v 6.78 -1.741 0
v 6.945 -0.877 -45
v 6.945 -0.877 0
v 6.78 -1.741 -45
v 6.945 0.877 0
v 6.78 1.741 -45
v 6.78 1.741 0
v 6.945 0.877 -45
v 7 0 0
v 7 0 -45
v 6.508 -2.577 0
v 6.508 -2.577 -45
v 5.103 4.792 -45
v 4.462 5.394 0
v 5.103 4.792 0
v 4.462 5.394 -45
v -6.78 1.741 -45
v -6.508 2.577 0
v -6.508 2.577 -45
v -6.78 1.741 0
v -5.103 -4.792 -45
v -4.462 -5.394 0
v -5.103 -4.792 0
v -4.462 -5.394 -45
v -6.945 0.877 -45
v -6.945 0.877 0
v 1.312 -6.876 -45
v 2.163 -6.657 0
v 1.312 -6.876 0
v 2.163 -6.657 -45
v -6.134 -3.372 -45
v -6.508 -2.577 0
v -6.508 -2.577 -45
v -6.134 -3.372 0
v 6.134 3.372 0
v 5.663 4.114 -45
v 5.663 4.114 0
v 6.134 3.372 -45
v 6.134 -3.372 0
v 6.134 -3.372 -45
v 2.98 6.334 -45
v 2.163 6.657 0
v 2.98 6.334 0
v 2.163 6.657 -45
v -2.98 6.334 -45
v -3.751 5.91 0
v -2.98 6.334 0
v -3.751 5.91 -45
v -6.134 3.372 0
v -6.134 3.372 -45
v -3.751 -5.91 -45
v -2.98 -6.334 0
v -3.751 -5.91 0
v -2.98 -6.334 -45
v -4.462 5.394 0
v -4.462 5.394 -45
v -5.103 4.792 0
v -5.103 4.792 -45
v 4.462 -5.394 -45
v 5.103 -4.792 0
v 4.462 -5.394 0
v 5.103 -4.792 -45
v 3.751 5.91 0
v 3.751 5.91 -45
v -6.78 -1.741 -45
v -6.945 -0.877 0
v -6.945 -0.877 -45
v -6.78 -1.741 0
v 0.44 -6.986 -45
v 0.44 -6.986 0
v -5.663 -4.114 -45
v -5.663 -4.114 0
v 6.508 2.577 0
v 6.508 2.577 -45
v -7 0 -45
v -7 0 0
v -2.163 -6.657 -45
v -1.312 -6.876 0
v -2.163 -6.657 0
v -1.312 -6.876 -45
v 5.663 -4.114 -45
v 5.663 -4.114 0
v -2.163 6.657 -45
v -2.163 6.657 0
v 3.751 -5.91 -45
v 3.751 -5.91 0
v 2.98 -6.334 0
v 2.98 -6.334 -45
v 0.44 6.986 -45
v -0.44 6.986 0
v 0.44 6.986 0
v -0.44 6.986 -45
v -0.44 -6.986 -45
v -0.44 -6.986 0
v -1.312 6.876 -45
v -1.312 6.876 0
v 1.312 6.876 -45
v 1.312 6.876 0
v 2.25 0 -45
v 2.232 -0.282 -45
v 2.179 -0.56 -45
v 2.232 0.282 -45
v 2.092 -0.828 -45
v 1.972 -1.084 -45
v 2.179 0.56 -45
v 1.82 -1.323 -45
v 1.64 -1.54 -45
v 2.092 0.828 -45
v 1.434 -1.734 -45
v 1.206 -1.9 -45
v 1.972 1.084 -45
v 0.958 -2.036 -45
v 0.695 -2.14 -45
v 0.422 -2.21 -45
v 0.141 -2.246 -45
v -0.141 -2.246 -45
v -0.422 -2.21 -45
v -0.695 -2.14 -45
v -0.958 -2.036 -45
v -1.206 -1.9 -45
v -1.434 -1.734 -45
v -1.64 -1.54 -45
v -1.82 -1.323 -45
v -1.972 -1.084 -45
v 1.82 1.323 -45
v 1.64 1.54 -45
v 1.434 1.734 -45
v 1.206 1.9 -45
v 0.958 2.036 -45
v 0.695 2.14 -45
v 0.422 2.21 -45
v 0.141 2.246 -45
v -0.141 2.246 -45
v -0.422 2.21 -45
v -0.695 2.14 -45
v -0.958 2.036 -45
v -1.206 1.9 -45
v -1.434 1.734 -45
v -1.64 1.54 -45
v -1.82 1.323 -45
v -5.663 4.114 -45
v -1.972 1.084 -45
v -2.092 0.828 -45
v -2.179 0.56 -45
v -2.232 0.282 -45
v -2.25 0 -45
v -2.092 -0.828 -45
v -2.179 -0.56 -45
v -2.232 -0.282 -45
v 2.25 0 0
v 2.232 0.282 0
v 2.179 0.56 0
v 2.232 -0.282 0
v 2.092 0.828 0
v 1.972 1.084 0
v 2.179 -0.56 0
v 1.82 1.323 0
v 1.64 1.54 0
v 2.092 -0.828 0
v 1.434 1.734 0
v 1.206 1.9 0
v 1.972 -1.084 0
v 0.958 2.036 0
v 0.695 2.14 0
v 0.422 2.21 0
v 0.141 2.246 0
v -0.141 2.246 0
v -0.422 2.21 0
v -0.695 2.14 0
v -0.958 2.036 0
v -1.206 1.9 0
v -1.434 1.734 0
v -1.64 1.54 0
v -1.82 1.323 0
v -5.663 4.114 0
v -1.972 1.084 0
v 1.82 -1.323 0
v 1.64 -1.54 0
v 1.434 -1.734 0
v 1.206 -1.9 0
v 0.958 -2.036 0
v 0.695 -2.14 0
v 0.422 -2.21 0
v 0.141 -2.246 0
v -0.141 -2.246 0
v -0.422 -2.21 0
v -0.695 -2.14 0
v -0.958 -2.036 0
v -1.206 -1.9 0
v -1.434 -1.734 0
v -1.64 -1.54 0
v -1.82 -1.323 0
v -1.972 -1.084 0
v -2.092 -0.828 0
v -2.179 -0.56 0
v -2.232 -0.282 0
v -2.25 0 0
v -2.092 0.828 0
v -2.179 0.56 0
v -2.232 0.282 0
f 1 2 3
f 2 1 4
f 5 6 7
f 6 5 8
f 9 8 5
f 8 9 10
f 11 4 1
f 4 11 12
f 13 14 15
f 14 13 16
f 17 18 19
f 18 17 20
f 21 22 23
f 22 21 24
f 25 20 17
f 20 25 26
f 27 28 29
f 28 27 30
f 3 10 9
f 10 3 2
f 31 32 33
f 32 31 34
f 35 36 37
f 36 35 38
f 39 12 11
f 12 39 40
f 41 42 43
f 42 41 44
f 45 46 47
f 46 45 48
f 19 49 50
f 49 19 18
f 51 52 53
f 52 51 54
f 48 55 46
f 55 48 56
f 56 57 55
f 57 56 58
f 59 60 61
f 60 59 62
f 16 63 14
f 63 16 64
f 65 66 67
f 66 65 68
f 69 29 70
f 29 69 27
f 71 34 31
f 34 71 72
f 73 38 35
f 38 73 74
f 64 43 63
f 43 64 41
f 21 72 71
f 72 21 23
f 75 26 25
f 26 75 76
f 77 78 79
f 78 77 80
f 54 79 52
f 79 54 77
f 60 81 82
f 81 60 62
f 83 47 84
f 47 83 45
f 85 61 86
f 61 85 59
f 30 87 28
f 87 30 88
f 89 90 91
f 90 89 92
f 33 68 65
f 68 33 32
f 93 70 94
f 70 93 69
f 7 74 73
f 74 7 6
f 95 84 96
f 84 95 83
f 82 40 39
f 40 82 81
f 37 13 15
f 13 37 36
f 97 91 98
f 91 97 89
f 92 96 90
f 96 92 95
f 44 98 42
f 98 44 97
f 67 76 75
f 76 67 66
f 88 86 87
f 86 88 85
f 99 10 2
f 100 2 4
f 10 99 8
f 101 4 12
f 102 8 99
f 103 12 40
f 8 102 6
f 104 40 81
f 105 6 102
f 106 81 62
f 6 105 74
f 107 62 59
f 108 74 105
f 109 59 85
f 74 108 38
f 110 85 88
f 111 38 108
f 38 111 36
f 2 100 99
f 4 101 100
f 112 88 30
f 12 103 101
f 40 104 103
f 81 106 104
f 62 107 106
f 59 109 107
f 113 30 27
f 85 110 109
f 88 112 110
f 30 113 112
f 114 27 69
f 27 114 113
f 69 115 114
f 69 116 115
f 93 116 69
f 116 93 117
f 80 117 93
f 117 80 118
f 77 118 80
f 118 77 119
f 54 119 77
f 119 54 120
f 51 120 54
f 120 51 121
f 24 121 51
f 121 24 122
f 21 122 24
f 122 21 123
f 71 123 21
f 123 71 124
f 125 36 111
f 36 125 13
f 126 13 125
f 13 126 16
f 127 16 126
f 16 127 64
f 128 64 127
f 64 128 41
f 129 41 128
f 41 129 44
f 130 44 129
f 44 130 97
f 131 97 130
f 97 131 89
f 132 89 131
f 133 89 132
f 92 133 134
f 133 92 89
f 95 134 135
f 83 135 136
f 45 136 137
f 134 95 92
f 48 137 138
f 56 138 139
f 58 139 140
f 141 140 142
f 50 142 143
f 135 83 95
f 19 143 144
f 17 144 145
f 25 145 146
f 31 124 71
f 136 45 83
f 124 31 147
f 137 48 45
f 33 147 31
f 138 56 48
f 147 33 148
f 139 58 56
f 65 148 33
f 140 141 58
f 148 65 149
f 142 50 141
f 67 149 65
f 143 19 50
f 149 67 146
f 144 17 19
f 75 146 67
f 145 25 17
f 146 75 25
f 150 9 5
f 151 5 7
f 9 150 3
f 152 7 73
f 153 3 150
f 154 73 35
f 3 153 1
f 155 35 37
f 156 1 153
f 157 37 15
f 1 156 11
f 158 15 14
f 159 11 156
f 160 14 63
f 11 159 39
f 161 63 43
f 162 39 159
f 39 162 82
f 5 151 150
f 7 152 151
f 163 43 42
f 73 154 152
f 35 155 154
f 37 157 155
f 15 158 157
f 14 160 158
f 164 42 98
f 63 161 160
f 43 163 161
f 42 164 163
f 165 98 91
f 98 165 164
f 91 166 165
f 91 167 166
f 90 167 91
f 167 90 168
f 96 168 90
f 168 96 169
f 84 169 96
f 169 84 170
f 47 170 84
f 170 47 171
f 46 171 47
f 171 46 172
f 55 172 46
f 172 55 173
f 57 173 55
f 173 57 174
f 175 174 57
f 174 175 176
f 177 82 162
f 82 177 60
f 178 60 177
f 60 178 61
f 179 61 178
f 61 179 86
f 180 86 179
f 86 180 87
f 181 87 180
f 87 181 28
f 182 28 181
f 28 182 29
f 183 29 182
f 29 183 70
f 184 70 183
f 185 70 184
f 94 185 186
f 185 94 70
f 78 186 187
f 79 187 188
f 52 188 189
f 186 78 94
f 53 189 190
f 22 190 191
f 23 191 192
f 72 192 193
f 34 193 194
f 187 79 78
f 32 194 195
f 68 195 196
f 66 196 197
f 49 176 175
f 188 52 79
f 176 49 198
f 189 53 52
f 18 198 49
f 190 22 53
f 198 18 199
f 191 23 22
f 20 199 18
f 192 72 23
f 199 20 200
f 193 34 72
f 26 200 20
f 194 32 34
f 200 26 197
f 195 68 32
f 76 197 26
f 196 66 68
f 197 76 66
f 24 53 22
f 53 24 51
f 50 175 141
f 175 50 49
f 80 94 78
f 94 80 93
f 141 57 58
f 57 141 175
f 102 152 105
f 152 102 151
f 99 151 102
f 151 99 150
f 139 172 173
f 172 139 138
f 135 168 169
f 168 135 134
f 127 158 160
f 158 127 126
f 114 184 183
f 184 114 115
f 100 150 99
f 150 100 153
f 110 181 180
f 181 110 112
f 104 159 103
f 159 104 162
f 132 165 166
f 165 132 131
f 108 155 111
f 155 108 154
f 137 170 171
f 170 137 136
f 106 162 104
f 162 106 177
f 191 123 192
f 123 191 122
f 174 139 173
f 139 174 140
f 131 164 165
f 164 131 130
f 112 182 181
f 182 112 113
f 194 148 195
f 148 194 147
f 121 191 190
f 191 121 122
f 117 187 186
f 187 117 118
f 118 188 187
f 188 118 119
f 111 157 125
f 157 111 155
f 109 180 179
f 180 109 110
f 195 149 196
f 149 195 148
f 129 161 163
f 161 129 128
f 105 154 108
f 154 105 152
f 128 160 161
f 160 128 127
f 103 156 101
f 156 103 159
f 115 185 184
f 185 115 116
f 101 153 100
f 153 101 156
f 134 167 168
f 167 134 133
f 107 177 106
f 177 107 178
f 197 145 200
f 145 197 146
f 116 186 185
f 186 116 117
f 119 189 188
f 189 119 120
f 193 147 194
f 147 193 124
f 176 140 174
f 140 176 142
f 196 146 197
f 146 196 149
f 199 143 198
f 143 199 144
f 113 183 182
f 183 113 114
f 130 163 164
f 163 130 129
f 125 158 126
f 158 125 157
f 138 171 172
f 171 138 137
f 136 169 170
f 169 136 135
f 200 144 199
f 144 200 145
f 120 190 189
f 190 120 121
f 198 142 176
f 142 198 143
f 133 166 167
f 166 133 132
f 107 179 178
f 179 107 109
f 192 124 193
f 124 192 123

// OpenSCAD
$fn = 50;


difference() {
	union() {
		translate(v = [0, 0, -45.0000000000]) {
			cylinder(h = 45, r = 7.0000000000);
		}
		cylinder(h = 0, r = 13.0000000000);
	}
	union() {
		#translate(v = [0, 0, -45]) {
			cylinder(h = 45, r = 2.2500000000);
		}
	}
}
